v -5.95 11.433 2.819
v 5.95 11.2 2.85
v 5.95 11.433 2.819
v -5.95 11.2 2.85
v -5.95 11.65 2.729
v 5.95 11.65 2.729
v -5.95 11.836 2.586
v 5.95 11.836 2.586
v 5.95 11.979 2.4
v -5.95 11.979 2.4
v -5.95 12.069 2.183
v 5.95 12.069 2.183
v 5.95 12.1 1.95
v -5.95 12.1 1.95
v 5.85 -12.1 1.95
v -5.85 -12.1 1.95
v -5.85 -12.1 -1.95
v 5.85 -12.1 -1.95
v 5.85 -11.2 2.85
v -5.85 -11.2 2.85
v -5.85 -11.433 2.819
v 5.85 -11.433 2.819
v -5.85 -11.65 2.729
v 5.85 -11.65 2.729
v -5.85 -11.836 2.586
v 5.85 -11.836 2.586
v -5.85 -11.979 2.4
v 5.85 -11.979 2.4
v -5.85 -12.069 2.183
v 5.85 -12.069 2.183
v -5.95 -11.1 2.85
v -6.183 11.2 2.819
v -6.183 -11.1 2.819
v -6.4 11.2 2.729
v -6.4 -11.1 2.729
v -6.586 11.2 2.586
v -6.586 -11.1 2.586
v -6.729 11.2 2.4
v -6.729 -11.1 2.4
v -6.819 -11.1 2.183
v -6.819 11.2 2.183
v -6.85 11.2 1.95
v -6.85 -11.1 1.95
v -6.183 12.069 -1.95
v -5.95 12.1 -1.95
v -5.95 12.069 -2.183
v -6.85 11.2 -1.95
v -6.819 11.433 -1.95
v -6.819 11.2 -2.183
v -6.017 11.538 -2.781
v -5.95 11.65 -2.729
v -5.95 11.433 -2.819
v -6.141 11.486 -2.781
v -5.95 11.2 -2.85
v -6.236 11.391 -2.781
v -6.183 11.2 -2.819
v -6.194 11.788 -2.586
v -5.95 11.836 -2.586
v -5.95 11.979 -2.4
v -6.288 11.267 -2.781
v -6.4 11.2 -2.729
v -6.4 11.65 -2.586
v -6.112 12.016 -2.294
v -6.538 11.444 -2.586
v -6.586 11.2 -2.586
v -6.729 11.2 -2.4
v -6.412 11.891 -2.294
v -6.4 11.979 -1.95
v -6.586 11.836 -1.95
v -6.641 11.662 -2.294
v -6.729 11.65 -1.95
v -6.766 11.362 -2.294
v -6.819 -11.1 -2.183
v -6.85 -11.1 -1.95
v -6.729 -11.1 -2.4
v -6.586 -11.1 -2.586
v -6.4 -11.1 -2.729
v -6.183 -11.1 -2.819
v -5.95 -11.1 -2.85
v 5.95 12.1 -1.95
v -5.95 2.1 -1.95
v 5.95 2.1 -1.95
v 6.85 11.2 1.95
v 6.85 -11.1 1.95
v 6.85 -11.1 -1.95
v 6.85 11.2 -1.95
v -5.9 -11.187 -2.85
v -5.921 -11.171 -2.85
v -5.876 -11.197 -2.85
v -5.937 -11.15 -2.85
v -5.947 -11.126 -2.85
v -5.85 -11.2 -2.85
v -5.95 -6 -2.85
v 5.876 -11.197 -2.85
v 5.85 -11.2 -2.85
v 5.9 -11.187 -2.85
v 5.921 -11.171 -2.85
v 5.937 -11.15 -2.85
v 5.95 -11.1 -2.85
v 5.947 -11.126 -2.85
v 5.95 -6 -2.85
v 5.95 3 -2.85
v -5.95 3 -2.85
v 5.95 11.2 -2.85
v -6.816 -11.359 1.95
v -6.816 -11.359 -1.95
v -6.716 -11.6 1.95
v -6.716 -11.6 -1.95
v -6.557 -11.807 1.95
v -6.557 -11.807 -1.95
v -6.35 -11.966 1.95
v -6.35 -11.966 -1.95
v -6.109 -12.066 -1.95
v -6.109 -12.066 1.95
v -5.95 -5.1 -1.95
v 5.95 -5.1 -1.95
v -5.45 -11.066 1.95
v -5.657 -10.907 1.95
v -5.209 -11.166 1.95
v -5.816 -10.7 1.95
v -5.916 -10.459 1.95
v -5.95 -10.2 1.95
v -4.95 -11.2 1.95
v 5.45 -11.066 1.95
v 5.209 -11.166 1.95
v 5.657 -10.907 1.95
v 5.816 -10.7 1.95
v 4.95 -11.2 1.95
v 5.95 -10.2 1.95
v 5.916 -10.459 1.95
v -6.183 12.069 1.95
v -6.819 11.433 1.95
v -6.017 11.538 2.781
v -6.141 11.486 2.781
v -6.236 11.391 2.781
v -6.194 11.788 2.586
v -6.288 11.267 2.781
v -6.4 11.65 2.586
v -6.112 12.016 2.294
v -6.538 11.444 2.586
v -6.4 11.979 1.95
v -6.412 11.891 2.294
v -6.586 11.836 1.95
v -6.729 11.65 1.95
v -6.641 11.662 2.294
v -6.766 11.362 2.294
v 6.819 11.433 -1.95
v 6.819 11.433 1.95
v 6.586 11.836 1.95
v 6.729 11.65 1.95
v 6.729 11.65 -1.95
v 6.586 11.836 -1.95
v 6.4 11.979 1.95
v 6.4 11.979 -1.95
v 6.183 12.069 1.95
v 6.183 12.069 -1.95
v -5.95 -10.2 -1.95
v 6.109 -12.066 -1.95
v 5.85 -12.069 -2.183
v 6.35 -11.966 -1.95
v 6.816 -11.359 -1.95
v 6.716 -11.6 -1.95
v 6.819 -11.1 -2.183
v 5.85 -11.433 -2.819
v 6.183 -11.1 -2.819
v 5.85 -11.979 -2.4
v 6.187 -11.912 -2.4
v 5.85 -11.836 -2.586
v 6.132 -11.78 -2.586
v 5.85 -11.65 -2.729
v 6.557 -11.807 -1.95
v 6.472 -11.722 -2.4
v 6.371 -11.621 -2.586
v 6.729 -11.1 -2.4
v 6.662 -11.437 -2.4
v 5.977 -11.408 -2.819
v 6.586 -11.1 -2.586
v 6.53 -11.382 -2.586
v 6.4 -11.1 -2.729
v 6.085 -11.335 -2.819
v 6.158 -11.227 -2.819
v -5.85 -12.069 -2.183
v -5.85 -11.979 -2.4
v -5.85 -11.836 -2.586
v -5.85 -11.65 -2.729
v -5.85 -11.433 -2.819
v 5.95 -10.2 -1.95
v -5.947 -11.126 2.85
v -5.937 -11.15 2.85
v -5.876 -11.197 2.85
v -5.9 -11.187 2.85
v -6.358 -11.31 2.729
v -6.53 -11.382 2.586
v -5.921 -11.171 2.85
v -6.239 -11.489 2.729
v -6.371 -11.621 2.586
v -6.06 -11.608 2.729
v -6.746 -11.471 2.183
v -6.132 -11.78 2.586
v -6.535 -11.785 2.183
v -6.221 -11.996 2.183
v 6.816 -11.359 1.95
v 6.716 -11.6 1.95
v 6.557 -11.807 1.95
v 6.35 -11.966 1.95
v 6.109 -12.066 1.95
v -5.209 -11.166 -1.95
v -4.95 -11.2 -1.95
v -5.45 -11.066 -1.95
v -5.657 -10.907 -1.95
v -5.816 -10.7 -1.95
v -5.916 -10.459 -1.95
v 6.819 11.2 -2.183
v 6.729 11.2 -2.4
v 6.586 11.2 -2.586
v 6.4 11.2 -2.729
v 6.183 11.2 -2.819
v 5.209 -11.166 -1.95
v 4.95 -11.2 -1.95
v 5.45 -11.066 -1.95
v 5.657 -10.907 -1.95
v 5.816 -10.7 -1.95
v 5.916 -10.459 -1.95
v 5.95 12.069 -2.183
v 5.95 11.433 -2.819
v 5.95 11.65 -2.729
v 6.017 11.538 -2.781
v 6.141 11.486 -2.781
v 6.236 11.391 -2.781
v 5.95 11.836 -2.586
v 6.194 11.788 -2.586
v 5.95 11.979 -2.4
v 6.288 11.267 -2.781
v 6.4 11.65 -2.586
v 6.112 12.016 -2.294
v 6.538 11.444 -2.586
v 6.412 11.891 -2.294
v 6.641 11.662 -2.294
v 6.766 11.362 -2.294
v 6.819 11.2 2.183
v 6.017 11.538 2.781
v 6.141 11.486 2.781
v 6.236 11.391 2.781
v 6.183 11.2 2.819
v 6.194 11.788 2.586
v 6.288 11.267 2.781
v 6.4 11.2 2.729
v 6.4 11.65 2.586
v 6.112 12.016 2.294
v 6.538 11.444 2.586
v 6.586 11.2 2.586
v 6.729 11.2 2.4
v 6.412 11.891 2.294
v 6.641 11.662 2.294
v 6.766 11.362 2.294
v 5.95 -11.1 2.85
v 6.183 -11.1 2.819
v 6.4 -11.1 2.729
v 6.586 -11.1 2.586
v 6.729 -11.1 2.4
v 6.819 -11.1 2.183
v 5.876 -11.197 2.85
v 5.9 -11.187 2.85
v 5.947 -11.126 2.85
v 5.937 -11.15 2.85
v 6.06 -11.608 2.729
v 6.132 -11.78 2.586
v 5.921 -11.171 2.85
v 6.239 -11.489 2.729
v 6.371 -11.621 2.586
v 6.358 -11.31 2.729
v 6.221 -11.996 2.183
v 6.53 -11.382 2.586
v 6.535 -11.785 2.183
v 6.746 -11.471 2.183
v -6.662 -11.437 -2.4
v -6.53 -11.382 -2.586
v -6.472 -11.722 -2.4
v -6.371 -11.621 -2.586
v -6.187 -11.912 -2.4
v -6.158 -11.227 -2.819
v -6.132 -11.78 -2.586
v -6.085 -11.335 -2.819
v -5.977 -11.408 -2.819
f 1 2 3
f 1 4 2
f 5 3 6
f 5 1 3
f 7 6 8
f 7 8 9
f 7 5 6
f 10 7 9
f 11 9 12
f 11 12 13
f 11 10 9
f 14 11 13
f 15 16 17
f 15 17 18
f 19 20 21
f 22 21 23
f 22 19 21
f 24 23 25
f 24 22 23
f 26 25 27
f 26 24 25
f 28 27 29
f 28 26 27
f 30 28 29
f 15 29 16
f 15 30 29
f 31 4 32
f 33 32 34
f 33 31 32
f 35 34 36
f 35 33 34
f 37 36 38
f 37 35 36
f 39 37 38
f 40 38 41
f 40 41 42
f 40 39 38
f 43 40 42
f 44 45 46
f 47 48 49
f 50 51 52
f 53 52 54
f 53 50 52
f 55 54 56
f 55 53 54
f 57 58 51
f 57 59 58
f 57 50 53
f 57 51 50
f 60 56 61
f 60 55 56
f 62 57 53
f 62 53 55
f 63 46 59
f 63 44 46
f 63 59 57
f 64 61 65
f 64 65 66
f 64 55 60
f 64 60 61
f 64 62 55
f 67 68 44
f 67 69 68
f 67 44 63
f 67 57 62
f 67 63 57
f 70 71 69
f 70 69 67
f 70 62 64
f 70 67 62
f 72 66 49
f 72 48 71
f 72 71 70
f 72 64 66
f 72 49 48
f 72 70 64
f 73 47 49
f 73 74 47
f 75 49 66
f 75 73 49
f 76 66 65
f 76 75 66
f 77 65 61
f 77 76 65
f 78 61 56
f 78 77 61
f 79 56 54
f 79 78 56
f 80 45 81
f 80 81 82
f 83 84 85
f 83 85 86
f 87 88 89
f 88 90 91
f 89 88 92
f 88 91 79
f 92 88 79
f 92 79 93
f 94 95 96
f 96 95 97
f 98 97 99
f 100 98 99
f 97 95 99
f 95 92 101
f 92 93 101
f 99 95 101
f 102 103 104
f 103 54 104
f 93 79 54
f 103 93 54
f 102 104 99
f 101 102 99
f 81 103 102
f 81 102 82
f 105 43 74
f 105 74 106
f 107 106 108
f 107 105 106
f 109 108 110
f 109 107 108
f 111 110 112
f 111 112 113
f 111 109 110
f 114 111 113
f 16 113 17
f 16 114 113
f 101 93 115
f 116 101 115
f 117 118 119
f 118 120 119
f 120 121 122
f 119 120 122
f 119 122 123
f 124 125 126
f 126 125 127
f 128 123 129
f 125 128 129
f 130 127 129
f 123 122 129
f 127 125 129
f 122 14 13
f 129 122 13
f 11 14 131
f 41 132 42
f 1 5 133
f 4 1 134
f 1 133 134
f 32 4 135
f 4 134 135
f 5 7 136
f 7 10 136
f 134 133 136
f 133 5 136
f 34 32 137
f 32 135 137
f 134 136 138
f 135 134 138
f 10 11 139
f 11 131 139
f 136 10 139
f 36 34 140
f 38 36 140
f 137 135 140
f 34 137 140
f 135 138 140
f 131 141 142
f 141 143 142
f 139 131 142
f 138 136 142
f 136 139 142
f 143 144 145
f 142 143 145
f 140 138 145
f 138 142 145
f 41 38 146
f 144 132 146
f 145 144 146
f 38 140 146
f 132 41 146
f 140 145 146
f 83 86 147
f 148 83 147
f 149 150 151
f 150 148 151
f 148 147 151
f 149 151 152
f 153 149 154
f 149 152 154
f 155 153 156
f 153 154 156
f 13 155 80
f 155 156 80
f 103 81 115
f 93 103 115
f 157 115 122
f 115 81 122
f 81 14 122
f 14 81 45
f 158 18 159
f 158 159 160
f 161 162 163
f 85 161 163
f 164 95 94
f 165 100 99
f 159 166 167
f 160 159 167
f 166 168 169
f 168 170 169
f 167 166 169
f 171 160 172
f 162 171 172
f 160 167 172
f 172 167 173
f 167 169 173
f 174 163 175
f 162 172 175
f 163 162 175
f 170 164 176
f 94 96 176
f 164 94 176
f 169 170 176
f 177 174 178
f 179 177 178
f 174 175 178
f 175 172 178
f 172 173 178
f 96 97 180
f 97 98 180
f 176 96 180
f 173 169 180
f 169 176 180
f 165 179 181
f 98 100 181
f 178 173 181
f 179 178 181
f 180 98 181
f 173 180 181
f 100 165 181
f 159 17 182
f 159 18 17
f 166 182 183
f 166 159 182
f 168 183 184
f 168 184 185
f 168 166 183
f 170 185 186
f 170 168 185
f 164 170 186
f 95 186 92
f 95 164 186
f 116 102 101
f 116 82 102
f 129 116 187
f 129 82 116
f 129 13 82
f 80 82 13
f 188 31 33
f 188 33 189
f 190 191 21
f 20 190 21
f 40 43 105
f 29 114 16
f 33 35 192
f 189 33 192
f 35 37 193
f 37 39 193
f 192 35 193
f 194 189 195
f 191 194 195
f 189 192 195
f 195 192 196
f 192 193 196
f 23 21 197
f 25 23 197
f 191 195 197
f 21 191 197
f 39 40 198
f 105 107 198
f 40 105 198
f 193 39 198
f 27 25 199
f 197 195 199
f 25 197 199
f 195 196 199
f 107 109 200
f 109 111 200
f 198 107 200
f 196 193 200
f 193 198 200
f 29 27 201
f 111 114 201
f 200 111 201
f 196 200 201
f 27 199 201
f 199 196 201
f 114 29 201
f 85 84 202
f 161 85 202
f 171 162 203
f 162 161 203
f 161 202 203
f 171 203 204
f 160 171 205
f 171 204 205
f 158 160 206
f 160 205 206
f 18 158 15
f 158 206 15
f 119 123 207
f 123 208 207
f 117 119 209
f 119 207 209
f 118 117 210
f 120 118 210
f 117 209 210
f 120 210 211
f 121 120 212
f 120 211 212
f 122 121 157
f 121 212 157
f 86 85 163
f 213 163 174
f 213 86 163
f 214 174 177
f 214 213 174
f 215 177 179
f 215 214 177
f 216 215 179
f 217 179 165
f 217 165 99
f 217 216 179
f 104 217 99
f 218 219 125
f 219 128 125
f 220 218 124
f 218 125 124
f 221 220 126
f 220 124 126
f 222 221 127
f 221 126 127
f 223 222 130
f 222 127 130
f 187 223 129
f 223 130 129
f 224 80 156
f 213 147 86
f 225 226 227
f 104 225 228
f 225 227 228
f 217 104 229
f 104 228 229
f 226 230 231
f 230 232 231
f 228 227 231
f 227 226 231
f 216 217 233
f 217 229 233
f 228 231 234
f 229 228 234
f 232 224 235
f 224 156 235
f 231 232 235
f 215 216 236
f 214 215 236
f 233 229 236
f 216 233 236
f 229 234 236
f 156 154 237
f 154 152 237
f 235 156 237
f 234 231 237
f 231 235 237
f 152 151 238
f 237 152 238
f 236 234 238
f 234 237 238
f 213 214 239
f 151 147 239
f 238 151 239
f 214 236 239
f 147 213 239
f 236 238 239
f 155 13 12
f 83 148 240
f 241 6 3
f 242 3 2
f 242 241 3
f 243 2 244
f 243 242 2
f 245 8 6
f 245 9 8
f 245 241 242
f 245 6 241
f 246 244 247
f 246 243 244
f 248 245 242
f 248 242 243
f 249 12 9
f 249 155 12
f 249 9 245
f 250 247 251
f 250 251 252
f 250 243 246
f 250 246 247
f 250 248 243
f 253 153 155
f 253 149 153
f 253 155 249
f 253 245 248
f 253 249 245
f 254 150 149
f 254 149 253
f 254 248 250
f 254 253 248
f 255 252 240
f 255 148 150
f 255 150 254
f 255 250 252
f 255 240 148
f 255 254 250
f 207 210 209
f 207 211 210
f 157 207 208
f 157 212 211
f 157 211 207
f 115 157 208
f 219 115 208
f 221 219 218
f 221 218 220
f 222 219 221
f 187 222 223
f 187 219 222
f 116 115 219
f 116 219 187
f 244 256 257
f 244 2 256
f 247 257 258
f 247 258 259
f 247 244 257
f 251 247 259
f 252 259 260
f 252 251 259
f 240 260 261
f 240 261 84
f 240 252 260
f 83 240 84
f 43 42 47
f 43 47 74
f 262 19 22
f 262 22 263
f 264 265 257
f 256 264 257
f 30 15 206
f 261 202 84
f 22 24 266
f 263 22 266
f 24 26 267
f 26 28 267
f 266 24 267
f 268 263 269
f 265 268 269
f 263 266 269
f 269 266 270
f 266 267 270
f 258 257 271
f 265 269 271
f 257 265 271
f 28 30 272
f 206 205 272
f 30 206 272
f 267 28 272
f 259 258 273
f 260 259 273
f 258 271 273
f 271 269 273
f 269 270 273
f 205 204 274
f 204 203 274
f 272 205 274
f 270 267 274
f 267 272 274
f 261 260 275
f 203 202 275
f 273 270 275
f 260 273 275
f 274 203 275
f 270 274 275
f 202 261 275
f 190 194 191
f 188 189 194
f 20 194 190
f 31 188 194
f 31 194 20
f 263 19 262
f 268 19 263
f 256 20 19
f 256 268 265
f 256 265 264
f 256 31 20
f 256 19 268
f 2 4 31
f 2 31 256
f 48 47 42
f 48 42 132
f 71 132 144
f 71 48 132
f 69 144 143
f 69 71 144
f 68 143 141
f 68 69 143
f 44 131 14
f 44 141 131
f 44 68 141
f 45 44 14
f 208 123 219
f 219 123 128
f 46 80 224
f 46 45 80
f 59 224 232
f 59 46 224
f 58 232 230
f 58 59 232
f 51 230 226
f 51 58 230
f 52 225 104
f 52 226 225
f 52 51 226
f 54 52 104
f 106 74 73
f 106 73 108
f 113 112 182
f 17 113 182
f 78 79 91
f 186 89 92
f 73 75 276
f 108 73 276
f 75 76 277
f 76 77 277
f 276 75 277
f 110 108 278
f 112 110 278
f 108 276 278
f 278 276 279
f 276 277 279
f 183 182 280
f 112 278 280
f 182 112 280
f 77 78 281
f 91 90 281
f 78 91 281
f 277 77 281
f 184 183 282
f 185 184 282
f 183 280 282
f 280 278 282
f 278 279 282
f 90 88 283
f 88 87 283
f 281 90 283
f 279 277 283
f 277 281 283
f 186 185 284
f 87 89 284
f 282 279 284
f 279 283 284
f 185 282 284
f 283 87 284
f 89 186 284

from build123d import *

# Parameters (mm, degrees)
F1_DEPTH    = 2.85
F2_DEPTH    = 1.95
F3_DEPTH    = 2.85
F4_DEPTH    = 1.95
F5_R        = 1
F7_DEPTH    = 25
F8_T1_DEPTH = 11.9
F9_R        = 0.89999


# Not quite as in the source:
# - a fillet or chamfer that OpenCascade refuses, or shapes differently, is made with other operations: its cross-section is extruded or revolved along the edge and cut away or added
# - a fillet or chamfer is up to 0.001 mm smaller than in the source, because OpenCascade refuses the exact size


with BuildPart() as f1:
    # F0 (on Top) → F1 (new body)
    with BuildSketch(Plane.XY):
        Polygon((-5.95, 11.2), (-5.95, -11.2), (5.95, -11.2), (5.95, 11.2), (5.95, 12.1), (-5.95, 12.1), align=None)
        Polygon((5.95, -11.2), (-5.95, -11.2), (-5.95, 11.2), (-5.95, 12.1), (-6.85, 12.1), (-6.85, -12.1), (6.85, -12.1), (6.85, 12.1), (5.95, 12.1), (5.95, 11.2), align=None)
    extrude(amount=F1_DEPTH)

    # F0 (on Top) → F2 (cut)
    with BuildSketch(Plane.XY):
        Polygon((-5.95, 11.2), (-5.95, -11.2), (5.95, -11.2), (5.95, 11.2), (5.95, 12.1), (-5.95, 12.1), align=None)
    extrude(amount=F2_DEPTH, mode=Mode.SUBTRACT)

    # F0 (on Top) → F3 (join)
    with BuildSketch(Plane.XY):
        Polygon((-5.95, 11.2), (-5.95, -11.2), (5.95, -11.2), (5.95, 11.2), (5.95, 12.1), (-5.95, 12.1), align=None)
        Polygon((5.95, -11.2), (-5.95, -11.2), (-5.95, 11.2), (-5.95, 12.1), (-6.85, 12.1), (-6.85, -12.1), (6.85, -12.1), (6.85, 12.1), (5.95, 12.1), (5.95, 11.2), align=None)
    extrude(amount=-F3_DEPTH)

    # F0 (on Top) → F4 (cut)
    with BuildSketch(Plane.XY):
        Polygon((-5.95, 11.2), (-5.95, -11.2), (5.95, -11.2), (5.95, 11.2), (5.95, 12.1), (-5.95, 12.1), align=None)
    extrude(amount=-F4_DEPTH, mode=Mode.SUBTRACT)

    # F5
    f5_edges = [f1.edges().sort_by_distance(p)[0] for p in [
        (5.95, -11.2, 0),
        (-5.95, -11.2, 0),
        (-6.85, -12.1, 0),
        (6.85, -12.1, 0),
    ]]
    fillet(f5_edges, radius=F5_R)

    # F6 (on Top) → F7 (cut)
    with BuildSketch(Plane.XY):
        Polygon((-5.95, 1), (-5.95, -4), (5.95, -4), (5.95, 1), (0, 1), align=None)
    extrude(amount=-F7_DEPTH, mode=Mode.SUBTRACT)

    # F8: chamfer of 2 on 2 edges, made by hand

    # F8_s2 → F8_t1 (cut)
    with BuildSketch(Plane.YZ.offset(-5.95)):
        Polygon((-6, -2.85), (-4, -0.85), (-4, -2.85), align=None)
        Polygon((3, -2.85), (1, -0.85), (1, -2.85), align=None)
    extrude(amount=F8_T1_DEPTH, mode=Mode.SUBTRACT)

    # F9 (radius 0.9 in the source; OpenCascade refuses exactly that, so slightly less here)
    f9_edges = [f1.edges().sort_by_distance(p)[0] for p in [
        (6.85, 12.1, 0),
        (-6.85, 12.1, 0),
        (0, 12.1, -2.85),
        (0, 12.1, 2.85),
        (6.85, 0.5, -2.85),
        (0, -12.1, 2.85),
        (-6.85, 0.5, 2.85),
        (-6.85, 0.5, -2.85),
        (-6.557107, -11.807107, -2.85),
        (0, -12.1, -2.85),
        (6.557107, -11.807107, -2.85),
        (6.85, 0.5, 2.85),
        (6.557107, -11.807107, 2.85),
        (-6.557107, -11.807107, 2.85),
    ]]
    fillet(f9_edges, radius=F9_R)


solid = f1.part
